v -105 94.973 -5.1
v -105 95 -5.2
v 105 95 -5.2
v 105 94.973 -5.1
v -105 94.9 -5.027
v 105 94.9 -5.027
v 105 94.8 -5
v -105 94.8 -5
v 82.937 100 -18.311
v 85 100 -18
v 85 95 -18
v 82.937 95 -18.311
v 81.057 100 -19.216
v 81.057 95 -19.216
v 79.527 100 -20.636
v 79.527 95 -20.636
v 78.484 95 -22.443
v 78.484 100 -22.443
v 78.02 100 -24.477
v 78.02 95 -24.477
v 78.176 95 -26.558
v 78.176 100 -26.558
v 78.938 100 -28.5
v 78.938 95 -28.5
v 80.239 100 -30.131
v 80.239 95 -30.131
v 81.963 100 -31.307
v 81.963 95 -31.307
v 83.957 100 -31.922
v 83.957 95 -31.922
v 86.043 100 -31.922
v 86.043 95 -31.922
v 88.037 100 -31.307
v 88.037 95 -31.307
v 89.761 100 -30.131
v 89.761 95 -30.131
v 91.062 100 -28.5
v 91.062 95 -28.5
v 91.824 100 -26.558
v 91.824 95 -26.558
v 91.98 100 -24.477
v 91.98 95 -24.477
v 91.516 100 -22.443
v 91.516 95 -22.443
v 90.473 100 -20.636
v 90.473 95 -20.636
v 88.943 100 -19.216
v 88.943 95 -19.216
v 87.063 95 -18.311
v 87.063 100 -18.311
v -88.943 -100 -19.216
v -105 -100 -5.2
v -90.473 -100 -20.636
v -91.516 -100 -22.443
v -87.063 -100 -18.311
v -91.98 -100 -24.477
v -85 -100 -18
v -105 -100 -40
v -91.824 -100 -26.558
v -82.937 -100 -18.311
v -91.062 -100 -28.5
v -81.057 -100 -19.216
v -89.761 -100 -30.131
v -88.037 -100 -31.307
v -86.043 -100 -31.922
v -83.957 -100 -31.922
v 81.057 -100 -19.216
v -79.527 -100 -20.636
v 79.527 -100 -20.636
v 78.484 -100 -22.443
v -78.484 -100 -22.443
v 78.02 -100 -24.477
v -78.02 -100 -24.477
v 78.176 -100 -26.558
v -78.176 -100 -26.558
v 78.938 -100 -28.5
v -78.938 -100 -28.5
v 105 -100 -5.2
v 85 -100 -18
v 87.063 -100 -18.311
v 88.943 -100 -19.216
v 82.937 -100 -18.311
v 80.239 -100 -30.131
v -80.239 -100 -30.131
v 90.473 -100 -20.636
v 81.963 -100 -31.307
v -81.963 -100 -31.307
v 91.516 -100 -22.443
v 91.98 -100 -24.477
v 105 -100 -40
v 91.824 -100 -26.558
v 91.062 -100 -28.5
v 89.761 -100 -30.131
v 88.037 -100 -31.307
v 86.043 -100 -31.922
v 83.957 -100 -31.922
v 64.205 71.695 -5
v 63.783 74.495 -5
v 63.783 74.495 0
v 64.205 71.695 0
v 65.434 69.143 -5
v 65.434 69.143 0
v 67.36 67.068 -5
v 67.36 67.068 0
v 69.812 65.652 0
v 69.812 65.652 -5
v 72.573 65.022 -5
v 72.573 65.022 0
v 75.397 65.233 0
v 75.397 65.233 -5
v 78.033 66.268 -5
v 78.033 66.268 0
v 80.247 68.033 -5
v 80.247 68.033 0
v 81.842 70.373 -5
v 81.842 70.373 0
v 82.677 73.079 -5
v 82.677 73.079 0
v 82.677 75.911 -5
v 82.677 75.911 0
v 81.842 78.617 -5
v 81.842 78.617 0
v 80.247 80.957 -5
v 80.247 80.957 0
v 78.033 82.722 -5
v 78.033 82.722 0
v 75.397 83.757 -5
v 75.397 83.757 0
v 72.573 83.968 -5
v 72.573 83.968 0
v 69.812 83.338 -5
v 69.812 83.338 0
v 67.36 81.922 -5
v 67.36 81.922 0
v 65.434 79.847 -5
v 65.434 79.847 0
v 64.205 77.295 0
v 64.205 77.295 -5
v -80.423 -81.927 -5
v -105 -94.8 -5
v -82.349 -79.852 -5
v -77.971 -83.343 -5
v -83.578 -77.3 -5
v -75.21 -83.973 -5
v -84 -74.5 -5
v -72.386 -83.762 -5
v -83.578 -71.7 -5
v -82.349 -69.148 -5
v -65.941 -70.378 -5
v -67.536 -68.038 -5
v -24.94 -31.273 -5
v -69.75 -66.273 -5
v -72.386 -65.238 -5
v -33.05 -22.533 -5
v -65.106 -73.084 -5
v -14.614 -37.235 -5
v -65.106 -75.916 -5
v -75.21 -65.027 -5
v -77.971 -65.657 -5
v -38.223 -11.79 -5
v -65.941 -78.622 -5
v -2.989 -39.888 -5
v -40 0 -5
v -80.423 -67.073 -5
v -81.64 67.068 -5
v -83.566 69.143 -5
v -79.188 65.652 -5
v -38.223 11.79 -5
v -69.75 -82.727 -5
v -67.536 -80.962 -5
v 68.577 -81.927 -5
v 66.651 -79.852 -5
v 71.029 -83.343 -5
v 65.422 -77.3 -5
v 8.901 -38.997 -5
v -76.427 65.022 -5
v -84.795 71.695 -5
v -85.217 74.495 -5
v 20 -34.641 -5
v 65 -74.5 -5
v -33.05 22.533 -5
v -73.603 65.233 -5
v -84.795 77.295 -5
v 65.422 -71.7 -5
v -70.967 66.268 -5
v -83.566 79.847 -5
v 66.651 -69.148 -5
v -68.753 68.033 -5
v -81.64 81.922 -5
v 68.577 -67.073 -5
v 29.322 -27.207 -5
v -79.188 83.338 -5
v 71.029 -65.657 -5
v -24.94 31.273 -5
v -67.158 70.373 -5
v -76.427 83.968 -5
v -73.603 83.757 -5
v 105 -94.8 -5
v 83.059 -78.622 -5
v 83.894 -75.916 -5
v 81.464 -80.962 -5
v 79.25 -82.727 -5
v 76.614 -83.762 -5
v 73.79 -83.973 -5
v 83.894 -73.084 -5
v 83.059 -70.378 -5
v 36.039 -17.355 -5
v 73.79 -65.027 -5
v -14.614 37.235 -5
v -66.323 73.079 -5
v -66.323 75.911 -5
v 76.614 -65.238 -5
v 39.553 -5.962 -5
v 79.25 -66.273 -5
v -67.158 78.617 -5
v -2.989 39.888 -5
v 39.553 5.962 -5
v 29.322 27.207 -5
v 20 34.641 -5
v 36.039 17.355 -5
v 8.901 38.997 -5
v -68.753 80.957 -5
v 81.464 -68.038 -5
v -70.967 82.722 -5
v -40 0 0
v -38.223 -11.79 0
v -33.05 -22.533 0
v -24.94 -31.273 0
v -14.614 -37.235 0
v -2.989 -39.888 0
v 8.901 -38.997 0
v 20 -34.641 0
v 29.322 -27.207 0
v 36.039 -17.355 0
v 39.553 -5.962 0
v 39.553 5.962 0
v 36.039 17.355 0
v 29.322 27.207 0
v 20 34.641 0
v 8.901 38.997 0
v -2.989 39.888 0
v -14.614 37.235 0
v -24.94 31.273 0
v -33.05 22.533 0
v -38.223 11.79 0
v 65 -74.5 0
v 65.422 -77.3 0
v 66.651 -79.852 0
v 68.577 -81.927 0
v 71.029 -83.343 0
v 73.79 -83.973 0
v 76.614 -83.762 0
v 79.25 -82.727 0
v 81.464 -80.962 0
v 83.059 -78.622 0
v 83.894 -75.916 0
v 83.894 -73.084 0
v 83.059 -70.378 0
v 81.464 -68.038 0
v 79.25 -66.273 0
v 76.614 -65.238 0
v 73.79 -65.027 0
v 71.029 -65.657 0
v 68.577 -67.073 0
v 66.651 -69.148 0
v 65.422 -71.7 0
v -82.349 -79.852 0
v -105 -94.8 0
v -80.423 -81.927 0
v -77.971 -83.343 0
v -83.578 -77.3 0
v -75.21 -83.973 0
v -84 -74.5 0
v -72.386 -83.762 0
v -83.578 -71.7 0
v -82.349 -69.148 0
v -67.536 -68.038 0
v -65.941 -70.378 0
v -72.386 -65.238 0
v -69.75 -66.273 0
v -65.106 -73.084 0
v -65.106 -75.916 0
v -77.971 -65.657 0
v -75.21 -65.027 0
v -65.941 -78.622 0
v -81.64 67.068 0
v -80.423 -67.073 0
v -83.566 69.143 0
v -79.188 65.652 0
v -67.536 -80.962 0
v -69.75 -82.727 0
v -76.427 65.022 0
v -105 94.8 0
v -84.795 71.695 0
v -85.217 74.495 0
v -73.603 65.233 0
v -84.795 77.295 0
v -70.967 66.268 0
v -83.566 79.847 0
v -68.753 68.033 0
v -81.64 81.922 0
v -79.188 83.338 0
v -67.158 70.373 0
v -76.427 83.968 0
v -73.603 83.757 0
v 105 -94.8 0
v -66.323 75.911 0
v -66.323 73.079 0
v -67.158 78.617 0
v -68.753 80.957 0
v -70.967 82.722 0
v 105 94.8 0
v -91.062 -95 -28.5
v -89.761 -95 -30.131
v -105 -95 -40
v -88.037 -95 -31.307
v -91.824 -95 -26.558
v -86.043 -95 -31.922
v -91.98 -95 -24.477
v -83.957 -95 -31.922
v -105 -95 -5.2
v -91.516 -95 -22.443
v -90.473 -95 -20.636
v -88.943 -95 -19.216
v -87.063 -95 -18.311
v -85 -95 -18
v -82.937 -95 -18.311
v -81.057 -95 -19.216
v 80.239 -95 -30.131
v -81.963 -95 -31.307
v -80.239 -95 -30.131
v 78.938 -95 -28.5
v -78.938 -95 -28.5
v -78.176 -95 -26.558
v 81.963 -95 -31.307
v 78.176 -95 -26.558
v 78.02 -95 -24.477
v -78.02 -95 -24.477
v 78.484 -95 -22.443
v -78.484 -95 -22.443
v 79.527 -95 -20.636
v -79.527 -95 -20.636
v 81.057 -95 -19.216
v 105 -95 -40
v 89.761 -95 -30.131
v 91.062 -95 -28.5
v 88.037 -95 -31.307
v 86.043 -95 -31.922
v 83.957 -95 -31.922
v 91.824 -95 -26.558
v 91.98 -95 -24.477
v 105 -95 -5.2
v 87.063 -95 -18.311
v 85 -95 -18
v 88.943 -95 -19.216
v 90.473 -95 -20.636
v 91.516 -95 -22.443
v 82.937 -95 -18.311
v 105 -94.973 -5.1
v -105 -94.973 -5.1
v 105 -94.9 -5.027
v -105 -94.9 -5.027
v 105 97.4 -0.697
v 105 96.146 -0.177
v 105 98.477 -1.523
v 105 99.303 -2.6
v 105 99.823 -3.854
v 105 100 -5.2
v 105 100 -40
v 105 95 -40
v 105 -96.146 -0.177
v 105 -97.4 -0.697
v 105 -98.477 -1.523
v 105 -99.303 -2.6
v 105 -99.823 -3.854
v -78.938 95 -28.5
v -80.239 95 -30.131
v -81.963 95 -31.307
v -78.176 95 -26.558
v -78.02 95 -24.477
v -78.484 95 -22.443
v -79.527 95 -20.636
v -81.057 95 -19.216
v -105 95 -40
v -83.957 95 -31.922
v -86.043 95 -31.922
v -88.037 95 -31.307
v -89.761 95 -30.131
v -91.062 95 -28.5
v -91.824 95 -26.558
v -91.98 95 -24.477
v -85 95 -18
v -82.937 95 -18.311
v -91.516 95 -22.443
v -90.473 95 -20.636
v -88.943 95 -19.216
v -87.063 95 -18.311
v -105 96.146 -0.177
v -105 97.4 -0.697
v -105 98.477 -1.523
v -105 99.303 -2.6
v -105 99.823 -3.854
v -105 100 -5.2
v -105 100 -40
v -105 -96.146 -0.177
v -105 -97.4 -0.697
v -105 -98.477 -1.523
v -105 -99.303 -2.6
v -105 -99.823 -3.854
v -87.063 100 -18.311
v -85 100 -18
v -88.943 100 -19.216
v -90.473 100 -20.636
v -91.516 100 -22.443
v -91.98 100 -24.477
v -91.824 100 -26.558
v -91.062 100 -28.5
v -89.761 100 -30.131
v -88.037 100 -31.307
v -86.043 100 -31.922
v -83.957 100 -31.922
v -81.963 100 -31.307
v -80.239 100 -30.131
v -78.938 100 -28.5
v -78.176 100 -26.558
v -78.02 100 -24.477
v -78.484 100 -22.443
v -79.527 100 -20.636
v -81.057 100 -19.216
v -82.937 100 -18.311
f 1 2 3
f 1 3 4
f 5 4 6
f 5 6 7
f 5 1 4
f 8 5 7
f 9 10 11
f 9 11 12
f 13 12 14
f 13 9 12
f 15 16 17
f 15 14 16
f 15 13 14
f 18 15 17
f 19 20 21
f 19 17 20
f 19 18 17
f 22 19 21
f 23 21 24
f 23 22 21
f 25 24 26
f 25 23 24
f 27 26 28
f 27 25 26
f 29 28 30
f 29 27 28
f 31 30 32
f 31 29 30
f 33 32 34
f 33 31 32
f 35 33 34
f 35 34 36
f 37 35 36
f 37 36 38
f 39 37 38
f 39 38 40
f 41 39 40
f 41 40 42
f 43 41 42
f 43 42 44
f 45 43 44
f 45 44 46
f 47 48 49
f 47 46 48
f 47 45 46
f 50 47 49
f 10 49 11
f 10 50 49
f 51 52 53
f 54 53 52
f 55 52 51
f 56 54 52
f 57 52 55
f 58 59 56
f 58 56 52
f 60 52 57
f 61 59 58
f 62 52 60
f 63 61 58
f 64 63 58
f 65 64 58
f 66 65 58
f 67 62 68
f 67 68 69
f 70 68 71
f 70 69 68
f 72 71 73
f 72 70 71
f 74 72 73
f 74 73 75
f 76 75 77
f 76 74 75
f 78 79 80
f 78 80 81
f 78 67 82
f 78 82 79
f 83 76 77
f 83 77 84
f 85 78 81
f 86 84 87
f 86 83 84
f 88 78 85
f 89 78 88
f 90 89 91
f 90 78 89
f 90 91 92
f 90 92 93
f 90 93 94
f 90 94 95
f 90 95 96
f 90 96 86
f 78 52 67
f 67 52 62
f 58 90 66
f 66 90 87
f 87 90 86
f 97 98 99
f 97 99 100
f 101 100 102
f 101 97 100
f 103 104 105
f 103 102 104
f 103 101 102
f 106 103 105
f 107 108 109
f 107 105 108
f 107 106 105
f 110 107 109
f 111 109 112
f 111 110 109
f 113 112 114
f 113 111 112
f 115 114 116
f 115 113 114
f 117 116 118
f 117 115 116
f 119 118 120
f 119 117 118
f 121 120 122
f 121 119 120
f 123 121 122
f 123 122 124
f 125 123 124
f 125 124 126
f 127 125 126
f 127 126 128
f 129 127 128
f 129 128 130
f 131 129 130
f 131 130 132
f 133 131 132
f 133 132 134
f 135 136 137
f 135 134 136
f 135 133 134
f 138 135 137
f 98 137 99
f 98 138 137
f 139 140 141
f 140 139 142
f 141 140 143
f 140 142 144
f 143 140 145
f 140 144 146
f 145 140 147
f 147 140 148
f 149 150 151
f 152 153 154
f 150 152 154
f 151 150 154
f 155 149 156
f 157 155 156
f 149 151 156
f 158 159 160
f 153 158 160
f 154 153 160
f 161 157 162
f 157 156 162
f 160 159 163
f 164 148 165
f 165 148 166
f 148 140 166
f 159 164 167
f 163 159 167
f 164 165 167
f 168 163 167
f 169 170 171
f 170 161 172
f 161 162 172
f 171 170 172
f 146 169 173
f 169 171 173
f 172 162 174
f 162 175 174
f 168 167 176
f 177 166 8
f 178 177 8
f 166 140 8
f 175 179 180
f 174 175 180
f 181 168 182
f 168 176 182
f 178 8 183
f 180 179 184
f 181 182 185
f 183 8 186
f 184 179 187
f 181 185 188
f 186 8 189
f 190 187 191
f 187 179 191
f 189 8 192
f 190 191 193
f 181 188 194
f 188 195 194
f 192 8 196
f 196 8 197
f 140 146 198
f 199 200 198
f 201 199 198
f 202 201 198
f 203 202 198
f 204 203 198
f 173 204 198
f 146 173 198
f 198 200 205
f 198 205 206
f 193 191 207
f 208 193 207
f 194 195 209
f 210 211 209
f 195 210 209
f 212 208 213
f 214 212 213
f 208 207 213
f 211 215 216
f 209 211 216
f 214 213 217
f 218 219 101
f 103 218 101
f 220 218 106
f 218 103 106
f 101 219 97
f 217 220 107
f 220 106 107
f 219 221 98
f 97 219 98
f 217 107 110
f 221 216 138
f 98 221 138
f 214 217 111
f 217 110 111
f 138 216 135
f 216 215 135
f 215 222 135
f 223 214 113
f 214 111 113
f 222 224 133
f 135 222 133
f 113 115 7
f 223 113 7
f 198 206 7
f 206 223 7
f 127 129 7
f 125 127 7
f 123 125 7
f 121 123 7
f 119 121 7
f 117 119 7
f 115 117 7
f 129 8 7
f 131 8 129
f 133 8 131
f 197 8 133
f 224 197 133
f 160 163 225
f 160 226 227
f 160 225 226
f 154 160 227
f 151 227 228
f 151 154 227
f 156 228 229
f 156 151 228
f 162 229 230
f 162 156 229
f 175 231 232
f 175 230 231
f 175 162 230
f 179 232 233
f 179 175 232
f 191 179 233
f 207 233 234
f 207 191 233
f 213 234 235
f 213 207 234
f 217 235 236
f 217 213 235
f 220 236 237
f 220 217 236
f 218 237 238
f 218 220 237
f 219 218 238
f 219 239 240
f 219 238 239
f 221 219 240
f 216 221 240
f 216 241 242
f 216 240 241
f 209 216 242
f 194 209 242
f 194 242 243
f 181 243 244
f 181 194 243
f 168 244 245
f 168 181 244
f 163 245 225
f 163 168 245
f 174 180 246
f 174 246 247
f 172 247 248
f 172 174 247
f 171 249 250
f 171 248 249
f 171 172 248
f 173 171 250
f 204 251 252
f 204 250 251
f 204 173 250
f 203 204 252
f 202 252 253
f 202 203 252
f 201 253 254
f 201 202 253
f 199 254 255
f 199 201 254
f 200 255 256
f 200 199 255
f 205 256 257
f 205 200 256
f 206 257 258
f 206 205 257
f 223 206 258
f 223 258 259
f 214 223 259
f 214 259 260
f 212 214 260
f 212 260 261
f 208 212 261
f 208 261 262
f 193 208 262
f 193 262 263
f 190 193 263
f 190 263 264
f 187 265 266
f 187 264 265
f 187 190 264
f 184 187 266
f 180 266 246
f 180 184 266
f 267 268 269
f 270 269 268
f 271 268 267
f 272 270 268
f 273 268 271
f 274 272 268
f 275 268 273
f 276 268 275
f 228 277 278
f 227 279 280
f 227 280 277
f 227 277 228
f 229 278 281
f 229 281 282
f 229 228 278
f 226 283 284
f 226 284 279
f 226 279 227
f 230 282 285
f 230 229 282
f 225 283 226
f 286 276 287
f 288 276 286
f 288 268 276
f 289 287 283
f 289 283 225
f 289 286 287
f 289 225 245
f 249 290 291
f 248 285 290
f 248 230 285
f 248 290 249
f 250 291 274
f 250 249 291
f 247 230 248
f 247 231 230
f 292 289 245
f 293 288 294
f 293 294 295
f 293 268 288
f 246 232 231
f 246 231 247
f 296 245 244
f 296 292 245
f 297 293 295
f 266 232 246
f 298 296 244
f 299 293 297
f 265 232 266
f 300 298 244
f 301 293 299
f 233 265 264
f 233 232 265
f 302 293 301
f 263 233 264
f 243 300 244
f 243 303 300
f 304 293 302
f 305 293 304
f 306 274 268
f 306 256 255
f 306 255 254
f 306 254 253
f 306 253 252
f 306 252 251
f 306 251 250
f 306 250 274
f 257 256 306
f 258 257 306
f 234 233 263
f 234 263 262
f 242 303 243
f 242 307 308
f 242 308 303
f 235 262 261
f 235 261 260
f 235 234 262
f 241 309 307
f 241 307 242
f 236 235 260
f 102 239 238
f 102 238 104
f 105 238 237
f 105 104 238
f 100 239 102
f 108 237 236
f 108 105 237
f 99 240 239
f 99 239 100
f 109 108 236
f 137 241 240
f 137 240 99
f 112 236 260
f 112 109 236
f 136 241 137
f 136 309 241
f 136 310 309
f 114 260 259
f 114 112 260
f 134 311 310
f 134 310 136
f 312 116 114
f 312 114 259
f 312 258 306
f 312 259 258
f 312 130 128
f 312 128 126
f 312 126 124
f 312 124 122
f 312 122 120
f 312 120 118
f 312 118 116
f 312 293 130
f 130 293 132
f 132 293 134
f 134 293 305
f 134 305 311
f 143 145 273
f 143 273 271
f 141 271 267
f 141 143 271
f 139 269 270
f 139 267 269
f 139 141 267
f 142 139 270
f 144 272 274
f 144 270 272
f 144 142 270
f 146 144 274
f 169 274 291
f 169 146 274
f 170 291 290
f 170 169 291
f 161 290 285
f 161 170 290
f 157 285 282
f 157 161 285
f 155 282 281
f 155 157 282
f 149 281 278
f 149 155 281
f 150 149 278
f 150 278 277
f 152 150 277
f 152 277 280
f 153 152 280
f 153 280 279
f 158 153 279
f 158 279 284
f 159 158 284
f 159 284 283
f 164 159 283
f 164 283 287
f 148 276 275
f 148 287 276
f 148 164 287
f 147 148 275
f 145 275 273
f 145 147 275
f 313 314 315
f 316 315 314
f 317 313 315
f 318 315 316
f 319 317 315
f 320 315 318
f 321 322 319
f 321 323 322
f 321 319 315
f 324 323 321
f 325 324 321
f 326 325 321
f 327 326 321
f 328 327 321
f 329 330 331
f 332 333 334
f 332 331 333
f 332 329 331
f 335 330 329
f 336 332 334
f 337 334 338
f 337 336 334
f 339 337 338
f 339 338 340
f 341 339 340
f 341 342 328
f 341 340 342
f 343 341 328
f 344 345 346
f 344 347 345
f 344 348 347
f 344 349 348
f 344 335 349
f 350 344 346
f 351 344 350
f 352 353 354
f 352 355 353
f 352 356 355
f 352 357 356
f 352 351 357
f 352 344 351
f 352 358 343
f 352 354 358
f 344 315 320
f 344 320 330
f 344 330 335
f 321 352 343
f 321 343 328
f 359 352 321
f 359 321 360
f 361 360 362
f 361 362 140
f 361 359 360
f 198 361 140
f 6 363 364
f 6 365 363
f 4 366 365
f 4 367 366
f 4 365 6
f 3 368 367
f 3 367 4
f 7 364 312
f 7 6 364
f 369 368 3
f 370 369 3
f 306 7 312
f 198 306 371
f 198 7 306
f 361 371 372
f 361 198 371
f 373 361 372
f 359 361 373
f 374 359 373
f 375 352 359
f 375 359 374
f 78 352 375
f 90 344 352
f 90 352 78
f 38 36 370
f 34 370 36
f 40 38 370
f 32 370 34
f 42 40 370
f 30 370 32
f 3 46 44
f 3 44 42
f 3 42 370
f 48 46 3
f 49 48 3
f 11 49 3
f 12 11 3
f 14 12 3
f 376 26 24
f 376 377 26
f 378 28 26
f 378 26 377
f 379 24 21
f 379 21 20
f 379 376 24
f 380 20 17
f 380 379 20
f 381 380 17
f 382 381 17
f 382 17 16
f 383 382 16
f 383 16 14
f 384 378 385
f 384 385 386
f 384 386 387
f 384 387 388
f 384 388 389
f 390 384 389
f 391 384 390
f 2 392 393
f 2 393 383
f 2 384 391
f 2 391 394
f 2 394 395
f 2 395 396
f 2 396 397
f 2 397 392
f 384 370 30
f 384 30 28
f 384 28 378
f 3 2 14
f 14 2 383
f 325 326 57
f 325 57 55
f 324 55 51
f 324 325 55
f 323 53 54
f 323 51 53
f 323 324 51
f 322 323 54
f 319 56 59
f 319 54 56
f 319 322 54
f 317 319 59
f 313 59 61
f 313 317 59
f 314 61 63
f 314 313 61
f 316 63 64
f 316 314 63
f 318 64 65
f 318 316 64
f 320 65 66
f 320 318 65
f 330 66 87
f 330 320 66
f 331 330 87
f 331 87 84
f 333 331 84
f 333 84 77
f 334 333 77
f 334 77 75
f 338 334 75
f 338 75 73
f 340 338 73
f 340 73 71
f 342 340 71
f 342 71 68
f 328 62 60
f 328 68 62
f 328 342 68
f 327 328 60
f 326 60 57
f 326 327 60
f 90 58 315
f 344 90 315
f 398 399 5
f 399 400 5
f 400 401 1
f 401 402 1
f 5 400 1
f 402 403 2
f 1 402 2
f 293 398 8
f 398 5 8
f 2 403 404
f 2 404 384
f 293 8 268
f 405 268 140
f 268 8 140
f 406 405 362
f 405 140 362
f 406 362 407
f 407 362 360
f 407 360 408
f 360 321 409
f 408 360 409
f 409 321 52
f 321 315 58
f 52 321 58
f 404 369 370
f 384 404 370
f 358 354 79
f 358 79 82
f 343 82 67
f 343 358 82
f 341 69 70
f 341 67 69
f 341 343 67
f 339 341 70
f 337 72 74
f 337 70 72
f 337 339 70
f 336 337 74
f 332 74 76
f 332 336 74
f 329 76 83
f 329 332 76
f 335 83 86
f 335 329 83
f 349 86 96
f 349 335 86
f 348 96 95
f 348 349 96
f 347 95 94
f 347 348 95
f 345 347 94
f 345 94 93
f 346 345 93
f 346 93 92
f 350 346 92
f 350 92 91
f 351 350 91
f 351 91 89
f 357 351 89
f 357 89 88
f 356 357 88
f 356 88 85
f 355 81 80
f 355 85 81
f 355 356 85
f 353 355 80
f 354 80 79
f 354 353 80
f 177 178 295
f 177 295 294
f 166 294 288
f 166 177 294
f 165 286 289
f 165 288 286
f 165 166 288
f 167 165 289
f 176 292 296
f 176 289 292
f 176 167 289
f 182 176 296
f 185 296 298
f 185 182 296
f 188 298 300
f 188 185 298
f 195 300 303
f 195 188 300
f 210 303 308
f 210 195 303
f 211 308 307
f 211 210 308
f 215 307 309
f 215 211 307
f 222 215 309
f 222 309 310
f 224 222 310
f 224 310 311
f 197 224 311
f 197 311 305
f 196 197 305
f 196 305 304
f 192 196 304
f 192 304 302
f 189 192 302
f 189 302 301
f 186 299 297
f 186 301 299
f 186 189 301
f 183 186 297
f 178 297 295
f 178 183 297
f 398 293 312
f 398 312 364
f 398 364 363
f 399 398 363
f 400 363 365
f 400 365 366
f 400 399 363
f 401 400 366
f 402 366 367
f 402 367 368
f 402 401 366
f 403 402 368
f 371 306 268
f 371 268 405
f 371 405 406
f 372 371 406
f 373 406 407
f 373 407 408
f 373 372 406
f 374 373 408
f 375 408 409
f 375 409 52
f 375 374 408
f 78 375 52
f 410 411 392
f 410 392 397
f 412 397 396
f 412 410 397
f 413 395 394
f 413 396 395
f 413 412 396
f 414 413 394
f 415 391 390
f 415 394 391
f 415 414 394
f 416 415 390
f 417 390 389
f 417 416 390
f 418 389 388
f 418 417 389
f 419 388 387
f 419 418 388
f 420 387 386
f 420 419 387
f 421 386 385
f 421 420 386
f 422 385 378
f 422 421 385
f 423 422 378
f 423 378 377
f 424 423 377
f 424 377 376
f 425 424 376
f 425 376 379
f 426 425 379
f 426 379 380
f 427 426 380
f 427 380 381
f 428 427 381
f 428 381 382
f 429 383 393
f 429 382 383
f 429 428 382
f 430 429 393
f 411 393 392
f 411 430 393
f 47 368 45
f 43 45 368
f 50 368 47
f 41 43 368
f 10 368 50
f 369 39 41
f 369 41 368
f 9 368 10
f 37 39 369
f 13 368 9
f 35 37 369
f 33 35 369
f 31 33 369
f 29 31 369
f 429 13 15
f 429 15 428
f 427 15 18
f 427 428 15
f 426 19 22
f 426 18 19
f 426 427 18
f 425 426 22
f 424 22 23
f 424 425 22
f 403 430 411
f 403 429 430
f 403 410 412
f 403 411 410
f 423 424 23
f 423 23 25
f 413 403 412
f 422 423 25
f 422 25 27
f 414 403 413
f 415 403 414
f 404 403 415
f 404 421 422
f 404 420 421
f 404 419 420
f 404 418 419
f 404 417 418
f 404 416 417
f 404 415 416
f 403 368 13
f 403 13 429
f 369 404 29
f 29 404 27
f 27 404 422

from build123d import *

# Parameters (mm, degrees)
SKETCH1_W                    = 210
SKETCH1_H                    = 200
BASE_FLANGE1_DEPTH           = 5
EDGE_FLANGE1_STRIP_W         = 20.4
EDGE_FLANGE1_STRIP_H         = 5
EDGE_FLANGE1_STRIP_CUT_DEPTH = 210
EDGE_FLANGE1_DEPTH           = 210
EDGE_FLANGE2_STRIP_W         = 20.4
EDGE_FLANGE2_STRIP_H         = 5
EDGE_FLANGE2_STRIP_CUT_DEPTH = 210
EDGE_FLANGE2_DEPTH           = 210
CUT_EXTRUDE1_DEPTH           = 151.416089565
CUT_EXTRUDE1_DEPTH_BACK      = 151.416089565
SKETCH12_R                   = 40
CUT_EXTRUDE2_DEPTH           = 151.416089565
CUT_EXTRUDE2_DEPTH_BACK      = 151.416089565
SKETCH13_R                   = 9.5
CUT_EXTRUDE3_DEPTH           = 230.401394939
CUT_EXTRUDE3_DEPTH_BACK      = 230.401394939
SKETCH14_R                   = 7


# Sheet-metal steps are written as plain solids
with BuildPart() as part:
    # Sketch1 → Base-Flange1 (new body)
    with BuildSketch(Plane.XY):
        Rectangle(SKETCH1_W, SKETCH1_H)
    extrude(amount=-BASE_FLANGE1_DEPTH)

    # Edge-Flange1 strip (across the edge) → Edge-Flange1 strip cut (cut)
    with BuildSketch(Plane(origin=(-105, 100, -5), x_dir=(0, -1, 0), z_dir=(1, 0, 0))):
        with Locations((-5, -2.5)):
            Rectangle(EDGE_FLANGE1_STRIP_W, EDGE_FLANGE1_STRIP_H)
    extrude(amount=EDGE_FLANGE1_STRIP_CUT_DEPTH, mode=Mode.SUBTRACT)

    # Edge-Flange1 section (across the edge) → Edge-Flange1 (add)
    with BuildSketch(Plane(origin=(-105, 100, -5), x_dir=(0, -1, 0), z_dir=(1, 0, 0))):
        with BuildLine():
            Line((0, 0.2), (0, 35))
            Line((0, 35), (5, 35))
            Line((5, 35), (5, 0.2))
            ThreePointArc((5, 0.2), (5.058578644, 0.058578644), (5.2, 0))
            Line((5.2, 0), (5.2, -5))
            ThreePointArc((5.2, -5), (1.523044738, -3.476955262), (0, 0.2))
        make_face()
    extrude(amount=EDGE_FLANGE1_DEPTH)

    # Edge-Flange2 strip (across the edge) → Edge-Flange2 strip cut (cut)
    with BuildSketch(Plane(origin=(105, -100, -5), x_dir=(0, 1, 0), z_dir=(-1, 0, 0))):
        with Locations((-5, -2.5)):
            Rectangle(EDGE_FLANGE2_STRIP_W, EDGE_FLANGE2_STRIP_H)
    extrude(amount=EDGE_FLANGE2_STRIP_CUT_DEPTH, mode=Mode.SUBTRACT)

    # Edge-Flange2 section (across the edge) → Edge-Flange2 (add)
    with BuildSketch(Plane(origin=(105, -100, -5), x_dir=(0, 1, 0), z_dir=(-1, 0, 0))):
        with BuildLine():
            Line((0, 0.2), (0, 35))
            Line((0, 35), (5, 35))
            Line((5, 35), (5, 0.2))
            ThreePointArc((5, 0.2), (5.058578644, 0.058578644), (5.2, 0))
            Line((5.2, 0), (5.2, -5))
            ThreePointArc((5.2, -5), (1.523044738, -3.476955262), (0, 0.2))
        make_face()
    extrude(amount=EDGE_FLANGE2_DEPTH)

    # Sketch12 → Cut-Extrude1 (cut, two sides: drawn at the far end of the back side and taken through both)
    with BuildSketch(Plane.XY.offset(-CUT_EXTRUDE1_DEPTH_BACK)):
        with Locations(Location((0, 0, 0), (0, 0, 180))):
            Circle(SKETCH12_R)
    extrude(amount=CUT_EXTRUDE1_DEPTH + CUT_EXTRUDE1_DEPTH_BACK, mode=Mode.SUBTRACT)

    # Sketch13 → Cut-Extrude2 (cut, two sides: drawn at the far end of the back side and taken through both)
    with BuildSketch(Plane.XY.offset(-CUT_EXTRUDE2_DEPTH_BACK)):
        with Locations(Location((73.282986518, 74.49502971, 0), (0, 0, 180))):
            Circle(SKETCH13_R)
        with Locations(Location((-75.717013482, 74.49502971, 0), (0, 0, 180))):
            Circle(SKETCH13_R)
        with Locations(Location((-74.5, -74.5, 0), (0, 0, 180))):
            Circle(SKETCH13_R)
        with Locations(Location((74.5, -74.5, 0), (0, 0, 180))):
            Circle(SKETCH13_R)
    extrude(amount=CUT_EXTRUDE2_DEPTH + CUT_EXTRUDE2_DEPTH_BACK, mode=Mode.SUBTRACT)

    # Sketch14 → Cut-Extrude3 (cut, two sides: drawn at the far end of the back side and taken through both)
    with BuildSketch(Plane(origin=(0, -100, 0), x_dir=(-1, 0, 0), z_dir=(0, -1, 0)).offset(-CUT_EXTRUDE3_DEPTH_BACK)):
        with Locations(Location((85, 25, 0), (0, 0, 270))):
            Circle(SKETCH14_R)
        with Locations(Location((-85, 25, 0), (0, 0, 270))):
            Circle(SKETCH14_R)
    extrude(amount=CUT_EXTRUDE3_DEPTH + CUT_EXTRUDE3_DEPTH_BACK, mode=Mode.SUBTRACT)


solid = part.part
